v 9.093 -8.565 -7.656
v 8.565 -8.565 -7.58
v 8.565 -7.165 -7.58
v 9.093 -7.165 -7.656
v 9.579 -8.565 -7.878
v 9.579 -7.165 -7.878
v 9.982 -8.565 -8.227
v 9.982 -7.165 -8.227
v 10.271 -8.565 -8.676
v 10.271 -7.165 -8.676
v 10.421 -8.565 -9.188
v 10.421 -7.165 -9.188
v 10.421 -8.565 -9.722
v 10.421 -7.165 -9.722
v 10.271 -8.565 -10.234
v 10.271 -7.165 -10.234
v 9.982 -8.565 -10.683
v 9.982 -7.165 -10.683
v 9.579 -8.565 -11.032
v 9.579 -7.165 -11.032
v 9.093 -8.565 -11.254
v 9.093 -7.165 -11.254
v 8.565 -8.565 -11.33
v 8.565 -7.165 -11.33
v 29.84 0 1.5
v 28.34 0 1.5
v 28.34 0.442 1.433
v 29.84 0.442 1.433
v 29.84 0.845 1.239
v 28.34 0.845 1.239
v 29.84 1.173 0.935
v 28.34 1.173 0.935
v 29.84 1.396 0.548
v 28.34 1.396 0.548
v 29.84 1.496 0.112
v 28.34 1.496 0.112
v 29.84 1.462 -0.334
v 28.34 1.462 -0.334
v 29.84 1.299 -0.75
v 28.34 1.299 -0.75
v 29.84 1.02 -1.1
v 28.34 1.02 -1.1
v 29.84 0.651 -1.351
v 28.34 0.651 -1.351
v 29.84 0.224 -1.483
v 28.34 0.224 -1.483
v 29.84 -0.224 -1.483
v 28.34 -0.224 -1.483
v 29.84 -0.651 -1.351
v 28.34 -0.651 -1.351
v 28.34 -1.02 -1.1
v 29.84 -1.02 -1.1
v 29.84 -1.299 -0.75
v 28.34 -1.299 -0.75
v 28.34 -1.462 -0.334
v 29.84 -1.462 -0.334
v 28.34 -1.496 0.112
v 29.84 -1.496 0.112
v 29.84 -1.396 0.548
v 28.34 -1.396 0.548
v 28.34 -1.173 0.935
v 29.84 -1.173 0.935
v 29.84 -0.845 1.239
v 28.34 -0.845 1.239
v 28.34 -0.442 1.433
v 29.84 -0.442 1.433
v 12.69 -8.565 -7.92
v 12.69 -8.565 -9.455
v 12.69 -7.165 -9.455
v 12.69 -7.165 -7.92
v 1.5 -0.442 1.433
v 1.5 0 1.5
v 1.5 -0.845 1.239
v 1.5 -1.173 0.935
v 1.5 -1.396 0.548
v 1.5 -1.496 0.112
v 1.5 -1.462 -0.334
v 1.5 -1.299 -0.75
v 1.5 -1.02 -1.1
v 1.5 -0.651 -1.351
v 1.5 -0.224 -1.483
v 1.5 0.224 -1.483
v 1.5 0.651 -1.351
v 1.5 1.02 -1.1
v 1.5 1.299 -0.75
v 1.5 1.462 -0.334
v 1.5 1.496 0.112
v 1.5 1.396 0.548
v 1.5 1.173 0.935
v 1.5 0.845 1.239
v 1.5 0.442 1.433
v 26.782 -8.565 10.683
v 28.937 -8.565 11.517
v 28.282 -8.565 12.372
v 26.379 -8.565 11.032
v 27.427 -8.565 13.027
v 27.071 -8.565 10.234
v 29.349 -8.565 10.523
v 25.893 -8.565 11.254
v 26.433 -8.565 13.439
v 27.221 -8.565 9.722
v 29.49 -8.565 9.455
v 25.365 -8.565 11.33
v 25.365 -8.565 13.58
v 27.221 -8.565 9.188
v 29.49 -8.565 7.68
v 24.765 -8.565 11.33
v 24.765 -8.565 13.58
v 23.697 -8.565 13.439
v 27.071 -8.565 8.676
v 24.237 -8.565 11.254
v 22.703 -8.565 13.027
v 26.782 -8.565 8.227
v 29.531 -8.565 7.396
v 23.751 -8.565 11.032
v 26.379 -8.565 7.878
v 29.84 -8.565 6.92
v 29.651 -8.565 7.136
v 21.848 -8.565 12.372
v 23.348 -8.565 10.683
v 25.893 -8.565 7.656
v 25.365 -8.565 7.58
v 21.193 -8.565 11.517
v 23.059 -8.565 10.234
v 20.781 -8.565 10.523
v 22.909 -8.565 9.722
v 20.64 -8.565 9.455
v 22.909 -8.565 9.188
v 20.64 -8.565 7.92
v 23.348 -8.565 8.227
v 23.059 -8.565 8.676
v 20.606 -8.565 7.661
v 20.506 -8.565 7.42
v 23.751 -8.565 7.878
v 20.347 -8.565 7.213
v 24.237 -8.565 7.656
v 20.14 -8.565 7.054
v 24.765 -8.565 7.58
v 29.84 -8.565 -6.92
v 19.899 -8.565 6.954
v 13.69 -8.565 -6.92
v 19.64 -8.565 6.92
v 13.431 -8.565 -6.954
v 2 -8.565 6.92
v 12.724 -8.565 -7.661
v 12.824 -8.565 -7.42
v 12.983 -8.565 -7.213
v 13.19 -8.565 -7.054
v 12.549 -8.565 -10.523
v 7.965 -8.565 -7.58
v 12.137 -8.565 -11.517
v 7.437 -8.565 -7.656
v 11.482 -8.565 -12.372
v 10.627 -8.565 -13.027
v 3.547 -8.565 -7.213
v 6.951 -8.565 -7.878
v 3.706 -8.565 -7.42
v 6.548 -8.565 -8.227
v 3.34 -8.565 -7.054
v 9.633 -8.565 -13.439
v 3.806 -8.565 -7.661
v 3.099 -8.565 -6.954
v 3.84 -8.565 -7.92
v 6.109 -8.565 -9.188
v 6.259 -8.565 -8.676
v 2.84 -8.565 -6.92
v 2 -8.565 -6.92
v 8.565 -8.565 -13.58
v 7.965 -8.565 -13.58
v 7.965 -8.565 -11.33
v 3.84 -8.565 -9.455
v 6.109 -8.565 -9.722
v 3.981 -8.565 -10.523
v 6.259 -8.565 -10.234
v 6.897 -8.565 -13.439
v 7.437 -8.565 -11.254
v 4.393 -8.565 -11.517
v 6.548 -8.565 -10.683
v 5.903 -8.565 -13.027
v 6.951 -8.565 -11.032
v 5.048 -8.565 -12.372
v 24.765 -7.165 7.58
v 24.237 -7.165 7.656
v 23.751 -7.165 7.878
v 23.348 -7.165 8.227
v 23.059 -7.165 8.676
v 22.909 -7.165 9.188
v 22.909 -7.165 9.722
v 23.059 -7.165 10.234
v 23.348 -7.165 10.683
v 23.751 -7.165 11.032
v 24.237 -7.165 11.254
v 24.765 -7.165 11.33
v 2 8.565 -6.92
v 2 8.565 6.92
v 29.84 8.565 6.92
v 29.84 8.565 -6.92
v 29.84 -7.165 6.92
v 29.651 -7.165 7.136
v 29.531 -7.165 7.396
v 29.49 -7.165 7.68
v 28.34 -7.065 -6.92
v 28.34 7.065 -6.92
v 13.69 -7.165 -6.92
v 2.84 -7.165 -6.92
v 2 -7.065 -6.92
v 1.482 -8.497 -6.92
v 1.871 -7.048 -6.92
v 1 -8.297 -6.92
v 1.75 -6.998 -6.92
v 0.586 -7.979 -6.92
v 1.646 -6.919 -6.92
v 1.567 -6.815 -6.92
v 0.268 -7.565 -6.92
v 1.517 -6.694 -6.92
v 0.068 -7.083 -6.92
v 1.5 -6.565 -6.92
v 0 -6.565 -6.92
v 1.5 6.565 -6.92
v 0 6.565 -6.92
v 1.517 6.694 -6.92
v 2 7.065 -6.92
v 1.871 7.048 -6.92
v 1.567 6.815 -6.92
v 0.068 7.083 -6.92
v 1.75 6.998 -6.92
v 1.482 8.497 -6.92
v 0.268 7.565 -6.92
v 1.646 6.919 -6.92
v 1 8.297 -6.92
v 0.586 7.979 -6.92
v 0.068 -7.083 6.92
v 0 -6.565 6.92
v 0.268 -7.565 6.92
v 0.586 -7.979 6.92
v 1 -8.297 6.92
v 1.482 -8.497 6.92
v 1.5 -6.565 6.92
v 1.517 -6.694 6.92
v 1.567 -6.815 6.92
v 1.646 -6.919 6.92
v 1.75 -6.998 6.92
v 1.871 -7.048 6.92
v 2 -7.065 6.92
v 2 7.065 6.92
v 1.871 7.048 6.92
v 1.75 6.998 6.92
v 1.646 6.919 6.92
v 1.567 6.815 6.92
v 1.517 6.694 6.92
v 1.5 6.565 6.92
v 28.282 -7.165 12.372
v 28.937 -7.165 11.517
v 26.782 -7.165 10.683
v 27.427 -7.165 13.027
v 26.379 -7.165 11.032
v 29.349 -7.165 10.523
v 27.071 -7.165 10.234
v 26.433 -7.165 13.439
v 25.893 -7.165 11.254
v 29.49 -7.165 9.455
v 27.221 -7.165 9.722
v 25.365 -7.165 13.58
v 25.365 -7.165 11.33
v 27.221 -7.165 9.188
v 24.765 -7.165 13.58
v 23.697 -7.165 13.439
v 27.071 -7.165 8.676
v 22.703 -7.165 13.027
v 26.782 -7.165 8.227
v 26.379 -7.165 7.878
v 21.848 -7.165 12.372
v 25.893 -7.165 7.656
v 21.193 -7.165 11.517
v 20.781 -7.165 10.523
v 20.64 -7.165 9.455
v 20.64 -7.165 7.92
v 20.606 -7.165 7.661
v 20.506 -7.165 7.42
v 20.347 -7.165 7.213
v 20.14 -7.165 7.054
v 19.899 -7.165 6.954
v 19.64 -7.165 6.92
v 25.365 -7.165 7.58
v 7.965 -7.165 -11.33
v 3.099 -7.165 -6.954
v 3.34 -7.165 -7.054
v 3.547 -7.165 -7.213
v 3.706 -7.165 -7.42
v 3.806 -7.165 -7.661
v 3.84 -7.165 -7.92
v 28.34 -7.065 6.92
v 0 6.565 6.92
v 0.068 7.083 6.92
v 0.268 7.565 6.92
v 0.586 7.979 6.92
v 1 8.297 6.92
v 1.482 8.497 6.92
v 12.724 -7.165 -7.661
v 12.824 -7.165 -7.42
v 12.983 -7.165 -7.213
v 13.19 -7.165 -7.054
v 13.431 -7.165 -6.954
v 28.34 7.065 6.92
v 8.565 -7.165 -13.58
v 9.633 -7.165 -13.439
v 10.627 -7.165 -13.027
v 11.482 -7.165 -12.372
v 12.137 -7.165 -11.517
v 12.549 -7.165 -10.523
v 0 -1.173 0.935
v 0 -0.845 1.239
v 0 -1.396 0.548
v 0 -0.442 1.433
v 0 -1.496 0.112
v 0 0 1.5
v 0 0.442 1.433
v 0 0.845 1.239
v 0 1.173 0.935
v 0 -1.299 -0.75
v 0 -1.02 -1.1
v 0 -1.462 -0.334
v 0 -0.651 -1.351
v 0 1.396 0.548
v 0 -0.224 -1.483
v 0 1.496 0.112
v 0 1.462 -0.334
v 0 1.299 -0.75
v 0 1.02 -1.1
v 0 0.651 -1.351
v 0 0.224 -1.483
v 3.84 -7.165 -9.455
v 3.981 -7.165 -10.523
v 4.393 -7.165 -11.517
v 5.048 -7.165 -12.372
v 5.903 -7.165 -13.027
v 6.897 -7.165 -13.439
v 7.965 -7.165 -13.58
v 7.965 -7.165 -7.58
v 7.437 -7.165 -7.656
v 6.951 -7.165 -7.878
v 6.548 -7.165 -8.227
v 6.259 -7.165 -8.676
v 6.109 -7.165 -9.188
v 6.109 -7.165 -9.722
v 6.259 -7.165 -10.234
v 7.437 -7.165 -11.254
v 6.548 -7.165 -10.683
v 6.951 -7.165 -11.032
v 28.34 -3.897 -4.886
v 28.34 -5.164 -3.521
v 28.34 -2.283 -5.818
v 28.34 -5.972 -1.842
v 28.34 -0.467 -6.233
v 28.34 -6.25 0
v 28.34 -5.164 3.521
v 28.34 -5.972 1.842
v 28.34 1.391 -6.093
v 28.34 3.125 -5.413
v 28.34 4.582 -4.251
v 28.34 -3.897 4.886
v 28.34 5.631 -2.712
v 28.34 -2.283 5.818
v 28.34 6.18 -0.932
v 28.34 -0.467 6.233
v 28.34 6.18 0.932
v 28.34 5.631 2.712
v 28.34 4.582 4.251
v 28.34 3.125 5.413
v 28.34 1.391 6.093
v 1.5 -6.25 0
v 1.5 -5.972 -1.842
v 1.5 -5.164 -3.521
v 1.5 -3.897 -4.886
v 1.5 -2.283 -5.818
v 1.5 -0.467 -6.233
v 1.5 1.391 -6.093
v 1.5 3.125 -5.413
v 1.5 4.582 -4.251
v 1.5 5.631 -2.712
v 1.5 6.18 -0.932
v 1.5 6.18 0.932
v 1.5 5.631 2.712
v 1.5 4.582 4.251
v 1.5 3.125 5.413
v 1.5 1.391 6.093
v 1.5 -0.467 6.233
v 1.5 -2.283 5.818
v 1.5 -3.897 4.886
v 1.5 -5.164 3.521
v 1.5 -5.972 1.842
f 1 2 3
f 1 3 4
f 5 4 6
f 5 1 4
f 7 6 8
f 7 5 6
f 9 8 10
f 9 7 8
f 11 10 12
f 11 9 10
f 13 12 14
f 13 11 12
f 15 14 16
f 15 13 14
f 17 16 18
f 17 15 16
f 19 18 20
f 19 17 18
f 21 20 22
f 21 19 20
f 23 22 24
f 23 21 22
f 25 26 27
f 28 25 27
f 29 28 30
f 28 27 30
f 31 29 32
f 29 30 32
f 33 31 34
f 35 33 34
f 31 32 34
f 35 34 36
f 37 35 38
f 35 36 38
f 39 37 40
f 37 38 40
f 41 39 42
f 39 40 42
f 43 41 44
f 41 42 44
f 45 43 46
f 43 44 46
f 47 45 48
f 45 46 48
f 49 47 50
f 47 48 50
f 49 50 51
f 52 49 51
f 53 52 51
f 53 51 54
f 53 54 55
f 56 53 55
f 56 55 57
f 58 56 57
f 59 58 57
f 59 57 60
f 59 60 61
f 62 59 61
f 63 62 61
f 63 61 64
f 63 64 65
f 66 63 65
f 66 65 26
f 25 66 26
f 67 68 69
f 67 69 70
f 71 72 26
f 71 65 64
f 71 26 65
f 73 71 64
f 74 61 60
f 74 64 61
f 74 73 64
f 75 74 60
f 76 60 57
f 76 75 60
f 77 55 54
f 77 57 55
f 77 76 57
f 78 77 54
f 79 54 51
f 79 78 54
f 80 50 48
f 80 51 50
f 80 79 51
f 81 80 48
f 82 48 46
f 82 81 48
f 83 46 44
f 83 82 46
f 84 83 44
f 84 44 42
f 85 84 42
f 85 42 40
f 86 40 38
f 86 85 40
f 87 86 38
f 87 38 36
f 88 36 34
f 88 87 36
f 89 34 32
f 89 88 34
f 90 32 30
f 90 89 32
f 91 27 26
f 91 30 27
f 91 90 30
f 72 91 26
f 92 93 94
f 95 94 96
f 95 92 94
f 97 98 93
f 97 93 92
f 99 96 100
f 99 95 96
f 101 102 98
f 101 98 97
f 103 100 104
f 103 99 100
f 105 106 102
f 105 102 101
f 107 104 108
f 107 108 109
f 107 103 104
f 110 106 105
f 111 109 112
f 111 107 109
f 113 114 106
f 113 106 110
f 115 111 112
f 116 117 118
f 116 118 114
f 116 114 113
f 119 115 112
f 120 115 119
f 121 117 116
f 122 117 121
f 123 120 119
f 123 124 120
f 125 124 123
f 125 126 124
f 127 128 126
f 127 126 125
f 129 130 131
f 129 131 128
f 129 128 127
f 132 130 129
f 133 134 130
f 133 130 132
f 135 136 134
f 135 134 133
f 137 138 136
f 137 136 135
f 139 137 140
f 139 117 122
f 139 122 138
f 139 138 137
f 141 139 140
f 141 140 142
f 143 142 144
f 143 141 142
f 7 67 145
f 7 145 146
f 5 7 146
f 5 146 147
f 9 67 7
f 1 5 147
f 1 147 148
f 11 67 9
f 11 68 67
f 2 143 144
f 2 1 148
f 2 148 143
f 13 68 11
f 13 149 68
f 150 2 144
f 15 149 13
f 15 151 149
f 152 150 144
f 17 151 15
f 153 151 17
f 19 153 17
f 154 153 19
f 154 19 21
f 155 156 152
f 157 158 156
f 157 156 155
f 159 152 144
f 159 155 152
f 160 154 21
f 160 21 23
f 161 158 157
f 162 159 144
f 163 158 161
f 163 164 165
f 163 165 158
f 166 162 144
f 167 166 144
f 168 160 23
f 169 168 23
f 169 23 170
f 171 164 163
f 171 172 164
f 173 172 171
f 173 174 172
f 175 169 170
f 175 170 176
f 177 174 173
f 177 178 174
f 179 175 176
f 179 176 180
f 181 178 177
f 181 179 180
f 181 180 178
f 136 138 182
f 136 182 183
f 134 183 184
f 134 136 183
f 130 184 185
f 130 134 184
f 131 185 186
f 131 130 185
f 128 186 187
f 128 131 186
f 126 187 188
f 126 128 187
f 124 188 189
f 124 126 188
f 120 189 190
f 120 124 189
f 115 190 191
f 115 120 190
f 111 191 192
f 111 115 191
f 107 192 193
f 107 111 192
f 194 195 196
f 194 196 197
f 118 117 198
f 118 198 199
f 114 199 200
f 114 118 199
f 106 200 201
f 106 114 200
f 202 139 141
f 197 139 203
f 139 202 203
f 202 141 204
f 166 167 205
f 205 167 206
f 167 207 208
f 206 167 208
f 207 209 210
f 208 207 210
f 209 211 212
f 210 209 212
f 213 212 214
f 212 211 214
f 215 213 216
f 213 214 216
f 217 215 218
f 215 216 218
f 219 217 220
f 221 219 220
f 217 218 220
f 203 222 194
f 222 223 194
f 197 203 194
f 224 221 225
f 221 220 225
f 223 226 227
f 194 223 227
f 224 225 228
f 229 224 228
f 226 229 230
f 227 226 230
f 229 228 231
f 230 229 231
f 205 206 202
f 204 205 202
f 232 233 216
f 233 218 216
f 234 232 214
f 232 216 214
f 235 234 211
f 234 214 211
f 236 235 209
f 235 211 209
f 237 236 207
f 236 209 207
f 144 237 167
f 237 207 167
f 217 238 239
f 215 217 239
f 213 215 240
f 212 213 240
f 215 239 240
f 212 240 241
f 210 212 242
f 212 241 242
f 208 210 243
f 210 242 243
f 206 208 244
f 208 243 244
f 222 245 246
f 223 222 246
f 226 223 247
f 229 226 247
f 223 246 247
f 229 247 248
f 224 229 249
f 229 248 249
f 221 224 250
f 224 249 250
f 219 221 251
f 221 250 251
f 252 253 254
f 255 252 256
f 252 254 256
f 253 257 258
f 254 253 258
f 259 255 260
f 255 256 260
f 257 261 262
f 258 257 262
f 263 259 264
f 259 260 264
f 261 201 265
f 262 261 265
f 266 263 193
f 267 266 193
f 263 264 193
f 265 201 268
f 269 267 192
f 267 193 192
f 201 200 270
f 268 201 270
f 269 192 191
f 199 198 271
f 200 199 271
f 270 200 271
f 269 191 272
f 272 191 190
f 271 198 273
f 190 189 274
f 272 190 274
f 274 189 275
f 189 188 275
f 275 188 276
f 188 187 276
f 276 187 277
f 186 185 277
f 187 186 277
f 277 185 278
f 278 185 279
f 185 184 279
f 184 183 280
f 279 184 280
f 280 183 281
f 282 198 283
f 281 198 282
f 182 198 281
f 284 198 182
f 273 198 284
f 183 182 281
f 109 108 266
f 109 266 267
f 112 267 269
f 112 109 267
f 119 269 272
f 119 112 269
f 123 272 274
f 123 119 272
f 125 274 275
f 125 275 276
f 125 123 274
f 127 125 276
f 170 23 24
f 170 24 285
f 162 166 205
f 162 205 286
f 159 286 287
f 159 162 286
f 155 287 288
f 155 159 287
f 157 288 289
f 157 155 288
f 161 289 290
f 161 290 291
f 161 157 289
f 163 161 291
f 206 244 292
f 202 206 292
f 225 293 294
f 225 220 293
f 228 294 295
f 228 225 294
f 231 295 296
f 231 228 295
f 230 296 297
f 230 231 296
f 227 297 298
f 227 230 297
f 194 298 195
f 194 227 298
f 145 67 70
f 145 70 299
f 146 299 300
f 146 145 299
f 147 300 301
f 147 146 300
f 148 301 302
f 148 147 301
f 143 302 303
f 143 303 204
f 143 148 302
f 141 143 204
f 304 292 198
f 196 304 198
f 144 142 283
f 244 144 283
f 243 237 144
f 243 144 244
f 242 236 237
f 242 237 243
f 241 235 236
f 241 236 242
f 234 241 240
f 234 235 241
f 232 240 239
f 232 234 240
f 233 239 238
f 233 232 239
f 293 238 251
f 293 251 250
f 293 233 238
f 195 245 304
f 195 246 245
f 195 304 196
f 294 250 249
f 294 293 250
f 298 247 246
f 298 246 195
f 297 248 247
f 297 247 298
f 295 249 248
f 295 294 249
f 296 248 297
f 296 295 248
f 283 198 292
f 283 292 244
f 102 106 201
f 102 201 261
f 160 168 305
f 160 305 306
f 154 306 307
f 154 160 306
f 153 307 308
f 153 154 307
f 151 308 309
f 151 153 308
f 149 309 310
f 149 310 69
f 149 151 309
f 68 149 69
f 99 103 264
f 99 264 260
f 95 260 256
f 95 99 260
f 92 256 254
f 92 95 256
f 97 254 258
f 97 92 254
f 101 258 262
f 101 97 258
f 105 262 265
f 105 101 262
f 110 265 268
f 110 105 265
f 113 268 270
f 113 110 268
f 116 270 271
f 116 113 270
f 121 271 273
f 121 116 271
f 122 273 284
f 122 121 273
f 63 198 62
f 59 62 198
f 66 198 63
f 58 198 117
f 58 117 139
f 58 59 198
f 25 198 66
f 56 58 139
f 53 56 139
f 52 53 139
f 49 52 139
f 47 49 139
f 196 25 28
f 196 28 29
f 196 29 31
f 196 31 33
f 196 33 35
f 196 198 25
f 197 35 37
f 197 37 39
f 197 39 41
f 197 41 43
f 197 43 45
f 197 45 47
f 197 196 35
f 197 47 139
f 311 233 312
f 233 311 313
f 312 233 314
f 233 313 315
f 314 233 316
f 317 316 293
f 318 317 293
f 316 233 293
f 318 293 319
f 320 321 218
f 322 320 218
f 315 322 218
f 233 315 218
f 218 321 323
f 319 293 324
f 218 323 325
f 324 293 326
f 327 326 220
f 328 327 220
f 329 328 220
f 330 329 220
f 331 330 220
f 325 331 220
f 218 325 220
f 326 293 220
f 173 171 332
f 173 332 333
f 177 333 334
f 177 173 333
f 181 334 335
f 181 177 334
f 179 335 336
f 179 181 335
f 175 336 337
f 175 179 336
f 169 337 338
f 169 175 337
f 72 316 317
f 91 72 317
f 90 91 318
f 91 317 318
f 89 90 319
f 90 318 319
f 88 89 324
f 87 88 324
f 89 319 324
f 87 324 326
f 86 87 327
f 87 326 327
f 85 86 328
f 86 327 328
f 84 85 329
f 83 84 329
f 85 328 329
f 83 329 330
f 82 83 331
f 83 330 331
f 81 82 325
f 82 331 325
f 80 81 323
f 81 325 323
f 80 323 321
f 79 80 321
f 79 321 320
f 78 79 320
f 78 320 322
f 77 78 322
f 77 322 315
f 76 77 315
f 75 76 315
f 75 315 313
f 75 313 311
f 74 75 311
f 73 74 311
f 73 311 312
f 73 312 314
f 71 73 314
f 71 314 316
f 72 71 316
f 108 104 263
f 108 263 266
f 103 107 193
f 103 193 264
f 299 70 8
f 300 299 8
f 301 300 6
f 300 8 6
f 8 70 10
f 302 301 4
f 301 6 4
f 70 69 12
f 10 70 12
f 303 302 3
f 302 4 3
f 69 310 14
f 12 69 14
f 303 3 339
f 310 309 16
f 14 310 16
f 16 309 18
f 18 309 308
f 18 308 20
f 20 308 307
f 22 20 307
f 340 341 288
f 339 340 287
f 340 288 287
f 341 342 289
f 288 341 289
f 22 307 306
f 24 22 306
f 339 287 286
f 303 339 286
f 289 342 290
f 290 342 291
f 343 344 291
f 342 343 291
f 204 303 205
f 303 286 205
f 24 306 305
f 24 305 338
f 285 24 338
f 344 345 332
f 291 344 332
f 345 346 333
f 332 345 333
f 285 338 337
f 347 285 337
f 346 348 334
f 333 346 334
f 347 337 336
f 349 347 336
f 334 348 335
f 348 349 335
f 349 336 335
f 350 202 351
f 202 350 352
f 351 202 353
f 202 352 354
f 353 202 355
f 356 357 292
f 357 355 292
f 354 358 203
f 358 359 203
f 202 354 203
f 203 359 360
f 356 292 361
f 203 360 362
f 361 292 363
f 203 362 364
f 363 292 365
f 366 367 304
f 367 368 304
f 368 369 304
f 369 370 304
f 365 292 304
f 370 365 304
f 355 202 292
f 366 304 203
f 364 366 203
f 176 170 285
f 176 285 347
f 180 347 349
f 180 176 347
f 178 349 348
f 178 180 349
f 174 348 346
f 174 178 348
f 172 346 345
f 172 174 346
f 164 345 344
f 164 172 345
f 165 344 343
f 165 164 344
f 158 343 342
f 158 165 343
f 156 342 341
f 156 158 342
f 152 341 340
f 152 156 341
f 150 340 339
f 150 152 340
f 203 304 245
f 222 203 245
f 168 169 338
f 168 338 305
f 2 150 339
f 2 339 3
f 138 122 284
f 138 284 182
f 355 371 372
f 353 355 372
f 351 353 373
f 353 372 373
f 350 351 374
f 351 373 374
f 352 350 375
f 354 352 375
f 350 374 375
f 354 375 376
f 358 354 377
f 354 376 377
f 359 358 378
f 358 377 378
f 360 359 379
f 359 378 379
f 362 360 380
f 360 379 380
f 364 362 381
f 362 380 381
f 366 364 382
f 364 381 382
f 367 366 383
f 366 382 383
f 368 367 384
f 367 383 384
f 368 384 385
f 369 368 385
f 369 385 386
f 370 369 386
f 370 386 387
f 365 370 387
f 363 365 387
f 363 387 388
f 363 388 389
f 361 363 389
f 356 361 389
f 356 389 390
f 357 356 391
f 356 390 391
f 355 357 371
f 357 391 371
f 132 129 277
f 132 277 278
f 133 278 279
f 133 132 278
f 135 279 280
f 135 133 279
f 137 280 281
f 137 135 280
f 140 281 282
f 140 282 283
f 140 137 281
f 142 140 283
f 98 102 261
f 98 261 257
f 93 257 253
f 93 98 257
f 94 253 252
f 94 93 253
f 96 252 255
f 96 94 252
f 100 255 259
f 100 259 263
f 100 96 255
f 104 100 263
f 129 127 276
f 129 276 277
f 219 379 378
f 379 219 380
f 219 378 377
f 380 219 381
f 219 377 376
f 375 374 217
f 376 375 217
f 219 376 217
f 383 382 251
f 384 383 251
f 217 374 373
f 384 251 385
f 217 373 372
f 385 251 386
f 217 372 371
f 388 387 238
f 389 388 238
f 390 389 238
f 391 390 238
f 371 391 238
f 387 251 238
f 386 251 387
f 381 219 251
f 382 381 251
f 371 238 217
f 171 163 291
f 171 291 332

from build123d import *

# Parameters (mm, degrees)
SKETCH1_W           = 13.84
SKETCH1_H           = 17.13
BOSS_EXTRUDE1_DEPTH = 29.84
SKETCH2_R           = 1.5
CUT_EXTRUDE1_DEPTH  = 29.84
BOSS_EXTRUDE2_DEPTH = 1.4
FILLET1_R           = 2
FILLET2_R           = 1
SKETCH4_W           = 10.2
SKETCH4_H           = 1.4
CUT_EXTRUDE2_DEPTH  = 38.202618523
SKETCH5_R           = 6.25
SKETCH5_R_2         = 1.5
BOSS_EXTRUDE3_DEPTH = 26.84


with BuildPart() as part:
    # Sketch1 → Boss-Extrude1 (new body)
    with BuildSketch(Plane(origin=(0, 0, 0), x_dir=(0, 0, -1), z_dir=(1, 0, 0))):
        Rectangle(SKETCH1_W, SKETCH1_H)
    extrude(amount=BOSS_EXTRUDE1_DEPTH)

    # Sketch2 → Cut-Extrude1 (cut)
    with BuildSketch(Plane.ZY):
        Circle(SKETCH2_R)
    extrude(amount=-CUT_EXTRUDE1_DEPTH, mode=Mode.SUBTRACT)

    # Sketch3 → Boss-Extrude2 (add)
    # profile 1 of 2: a face of its own
    with BuildSketch(Plane.XZ.offset(8.565)):
        with BuildLine():
            Line((20.64, 9.455), (20.64, 6.92))
            Line((20.64, 6.92), (29.49, 6.92))
            Line((29.49, 6.92), (29.49, 9.455))
            ThreePointArc((29.49, 9.455), (28.281815472, 12.371815472), (25.365, 13.58))
            Line((25.365, 13.58), (24.765, 13.58))
            ThreePointArc((24.765, 13.58), (21.848184528, 12.371815472), (20.64, 9.455))
        make_face()
        with BuildLine():
            ThreePointArc((24.765, 7.58), (22.89, 9.455), (24.765, 11.33))
            Line((24.765, 11.33), (25.365, 11.33))
            ThreePointArc((25.365, 11.33), (27.24, 9.455), (25.365, 7.58))
            Line((25.365, 7.58), (24.765, 7.58))
        make_face(mode=Mode.SUBTRACT)
    # profile 2 of 2: a face of its own
    with BuildSketch(Plane.XZ.offset(8.565)):
        with BuildLine():
            Line((3.84, -6.92), (3.84, -9.455))
            ThreePointArc((3.84, -9.455), (5.048184528, -12.371815472), (7.965, -13.58))
            Line((7.965, -13.58), (8.565, -13.58))
            ThreePointArc((8.565, -13.58), (11.481815472, -12.371815472), (12.69, -9.455))
            Line((12.69, -9.455), (12.69, -6.92))
            Line((12.69, -6.92), (3.84, -6.92))
        make_face()
        with BuildLine():
            ThreePointArc((8.565, -7.58), (10.44, -9.455), (8.565, -11.33))
            Line((8.565, -11.33), (7.965, -11.33))
            ThreePointArc((7.965, -11.33), (6.09, -9.455), (7.965, -7.58))
            Line((7.965, -7.58), (8.565, -7.58))
        make_face(mode=Mode.SUBTRACT)
    extrude(amount=-BOSS_EXTRUDE2_DEPTH)

    # Fillet1
    fillet1_edges = [part.edges().sort_by_distance(p)[0] for p in [
        (0, -8.565, 0),
        (0, 8.565, 0),
    ]]
    fillet(fillet1_edges, radius=FILLET1_R)

    # Fillet2
    # the kernel refuses this fillet: 1 mm, written as the material it adds along each edge
    with BuildSketch(Plane(origin=(3.84, -8.565, -6.92), x_dir=(-1, 0, 0), z_dir=(0, 1, 0))) as fillet2_piece_1:
        with BuildLine():
            CenterArc((FILLET2_R, -FILLET2_R), FILLET2_R, 90, 90)
            Line((0, -FILLET2_R), (-FILLET2_R * 0.02, -FILLET2_R))
            Line((-FILLET2_R * 0.02, -FILLET2_R), (-FILLET2_R * 0.02, FILLET2_R * 0.02))
            Line((-FILLET2_R * 0.02, FILLET2_R * 0.02), (FILLET2_R, FILLET2_R * 0.02))
            Line((FILLET2_R, FILLET2_R * 0.02), (FILLET2_R, 0))
        make_face()
    extrude(amount=1.4)
    with BuildSketch(Plane(origin=(20.64, -8.565, 6.92), x_dir=(-1, 0, 0), z_dir=(0, 1, 0)), Plane(origin=(12.69, -8.565, -6.92), x_dir=(1, 0, 0), z_dir=(0, 1, 0))) as fillet2_piece_2:
        with BuildLine():
            CenterArc((FILLET2_R, FILLET2_R), FILLET2_R, 180, 90)
            Line((0, FILLET2_R), (-FILLET2_R * 0.02, FILLET2_R))
            Line((-FILLET2_R * 0.02, FILLET2_R), (-FILLET2_R * 0.02, -FILLET2_R * 0.02))
            Line((-FILLET2_R * 0.02, -FILLET2_R * 0.02), (FILLET2_R, -FILLET2_R * 0.02))
            Line((FILLET2_R, -FILLET2_R * 0.02), (FILLET2_R, 0))
        make_face()
    extrude(amount=1.4)
    with BuildSketch(Plane(origin=(29.49, -8.565, 6.92), x_dir=(1, 0, 0), z_dir=(0, 1, 0))) as fillet2_piece_3:
        with BuildLine():
            CenterArc((1, -0.759934208), FILLET2_R, 130.541601874, 49.458398126)
            Line((0, -0.759934208), (-0.02, -0.759934208))
            Line((-0.02, -0.759934208), (-0.02, 0))
            Line((-0.02, 0), (0, 0.02))
            ThreePointArc((0, 0.02), (0.175, 0.02), (0.337, 0.015198684))
            Line((0.337, 0.015198684), (0.35, 0))
        make_face()
    extrude(amount=1.4)

    # Sketch4 → Cut-Extrude2 (cut, through all)
    with BuildSketch(Plane.XY.offset(6.92)):
        with BuildLine():
            Line((18.14, -7.065), (18.14, -5.665))
            Line((18.14, -5.665), (28.34, -5.665))
            Line((28.34, -5.665), (28.34, 7.065))
            Line((28.34, 7.065), (2, 7.065))
            ThreePointArc((2, 7.065), (1.646446609, 6.918553391), (1.5, 6.565))
            Line((1.5, 6.565), (1.5, -6.565))
            ThreePointArc((1.5, -6.565), (1.646446609, -6.918553391), (2, -7.065))
            Line((2, -7.065), (18.14, -7.065))
        make_face()
        with Locations((23.24, -6.365)):
            Rectangle(SKETCH4_W, SKETCH4_H)
    extrude(amount=-CUT_EXTRUDE2_DEPTH, mode=Mode.SUBTRACT)

    # Sketch5 → Boss-Extrude3 (add)
    with BuildSketch(Plane(origin=(1.5, 0, 0), x_dir=(0, 0, -1), z_dir=(1, 0, 0))):
        with Locations(Location((0, 0, 0), (0, 0, 270))):
            Circle(SKETCH5_R)
        with Locations(Location((0, 0, 0), (0, 0, 180))):
            Circle(SKETCH5_R_2, mode=Mode.SUBTRACT)
    extrude(amount=BOSS_EXTRUDE3_DEPTH)


solid = part.part
